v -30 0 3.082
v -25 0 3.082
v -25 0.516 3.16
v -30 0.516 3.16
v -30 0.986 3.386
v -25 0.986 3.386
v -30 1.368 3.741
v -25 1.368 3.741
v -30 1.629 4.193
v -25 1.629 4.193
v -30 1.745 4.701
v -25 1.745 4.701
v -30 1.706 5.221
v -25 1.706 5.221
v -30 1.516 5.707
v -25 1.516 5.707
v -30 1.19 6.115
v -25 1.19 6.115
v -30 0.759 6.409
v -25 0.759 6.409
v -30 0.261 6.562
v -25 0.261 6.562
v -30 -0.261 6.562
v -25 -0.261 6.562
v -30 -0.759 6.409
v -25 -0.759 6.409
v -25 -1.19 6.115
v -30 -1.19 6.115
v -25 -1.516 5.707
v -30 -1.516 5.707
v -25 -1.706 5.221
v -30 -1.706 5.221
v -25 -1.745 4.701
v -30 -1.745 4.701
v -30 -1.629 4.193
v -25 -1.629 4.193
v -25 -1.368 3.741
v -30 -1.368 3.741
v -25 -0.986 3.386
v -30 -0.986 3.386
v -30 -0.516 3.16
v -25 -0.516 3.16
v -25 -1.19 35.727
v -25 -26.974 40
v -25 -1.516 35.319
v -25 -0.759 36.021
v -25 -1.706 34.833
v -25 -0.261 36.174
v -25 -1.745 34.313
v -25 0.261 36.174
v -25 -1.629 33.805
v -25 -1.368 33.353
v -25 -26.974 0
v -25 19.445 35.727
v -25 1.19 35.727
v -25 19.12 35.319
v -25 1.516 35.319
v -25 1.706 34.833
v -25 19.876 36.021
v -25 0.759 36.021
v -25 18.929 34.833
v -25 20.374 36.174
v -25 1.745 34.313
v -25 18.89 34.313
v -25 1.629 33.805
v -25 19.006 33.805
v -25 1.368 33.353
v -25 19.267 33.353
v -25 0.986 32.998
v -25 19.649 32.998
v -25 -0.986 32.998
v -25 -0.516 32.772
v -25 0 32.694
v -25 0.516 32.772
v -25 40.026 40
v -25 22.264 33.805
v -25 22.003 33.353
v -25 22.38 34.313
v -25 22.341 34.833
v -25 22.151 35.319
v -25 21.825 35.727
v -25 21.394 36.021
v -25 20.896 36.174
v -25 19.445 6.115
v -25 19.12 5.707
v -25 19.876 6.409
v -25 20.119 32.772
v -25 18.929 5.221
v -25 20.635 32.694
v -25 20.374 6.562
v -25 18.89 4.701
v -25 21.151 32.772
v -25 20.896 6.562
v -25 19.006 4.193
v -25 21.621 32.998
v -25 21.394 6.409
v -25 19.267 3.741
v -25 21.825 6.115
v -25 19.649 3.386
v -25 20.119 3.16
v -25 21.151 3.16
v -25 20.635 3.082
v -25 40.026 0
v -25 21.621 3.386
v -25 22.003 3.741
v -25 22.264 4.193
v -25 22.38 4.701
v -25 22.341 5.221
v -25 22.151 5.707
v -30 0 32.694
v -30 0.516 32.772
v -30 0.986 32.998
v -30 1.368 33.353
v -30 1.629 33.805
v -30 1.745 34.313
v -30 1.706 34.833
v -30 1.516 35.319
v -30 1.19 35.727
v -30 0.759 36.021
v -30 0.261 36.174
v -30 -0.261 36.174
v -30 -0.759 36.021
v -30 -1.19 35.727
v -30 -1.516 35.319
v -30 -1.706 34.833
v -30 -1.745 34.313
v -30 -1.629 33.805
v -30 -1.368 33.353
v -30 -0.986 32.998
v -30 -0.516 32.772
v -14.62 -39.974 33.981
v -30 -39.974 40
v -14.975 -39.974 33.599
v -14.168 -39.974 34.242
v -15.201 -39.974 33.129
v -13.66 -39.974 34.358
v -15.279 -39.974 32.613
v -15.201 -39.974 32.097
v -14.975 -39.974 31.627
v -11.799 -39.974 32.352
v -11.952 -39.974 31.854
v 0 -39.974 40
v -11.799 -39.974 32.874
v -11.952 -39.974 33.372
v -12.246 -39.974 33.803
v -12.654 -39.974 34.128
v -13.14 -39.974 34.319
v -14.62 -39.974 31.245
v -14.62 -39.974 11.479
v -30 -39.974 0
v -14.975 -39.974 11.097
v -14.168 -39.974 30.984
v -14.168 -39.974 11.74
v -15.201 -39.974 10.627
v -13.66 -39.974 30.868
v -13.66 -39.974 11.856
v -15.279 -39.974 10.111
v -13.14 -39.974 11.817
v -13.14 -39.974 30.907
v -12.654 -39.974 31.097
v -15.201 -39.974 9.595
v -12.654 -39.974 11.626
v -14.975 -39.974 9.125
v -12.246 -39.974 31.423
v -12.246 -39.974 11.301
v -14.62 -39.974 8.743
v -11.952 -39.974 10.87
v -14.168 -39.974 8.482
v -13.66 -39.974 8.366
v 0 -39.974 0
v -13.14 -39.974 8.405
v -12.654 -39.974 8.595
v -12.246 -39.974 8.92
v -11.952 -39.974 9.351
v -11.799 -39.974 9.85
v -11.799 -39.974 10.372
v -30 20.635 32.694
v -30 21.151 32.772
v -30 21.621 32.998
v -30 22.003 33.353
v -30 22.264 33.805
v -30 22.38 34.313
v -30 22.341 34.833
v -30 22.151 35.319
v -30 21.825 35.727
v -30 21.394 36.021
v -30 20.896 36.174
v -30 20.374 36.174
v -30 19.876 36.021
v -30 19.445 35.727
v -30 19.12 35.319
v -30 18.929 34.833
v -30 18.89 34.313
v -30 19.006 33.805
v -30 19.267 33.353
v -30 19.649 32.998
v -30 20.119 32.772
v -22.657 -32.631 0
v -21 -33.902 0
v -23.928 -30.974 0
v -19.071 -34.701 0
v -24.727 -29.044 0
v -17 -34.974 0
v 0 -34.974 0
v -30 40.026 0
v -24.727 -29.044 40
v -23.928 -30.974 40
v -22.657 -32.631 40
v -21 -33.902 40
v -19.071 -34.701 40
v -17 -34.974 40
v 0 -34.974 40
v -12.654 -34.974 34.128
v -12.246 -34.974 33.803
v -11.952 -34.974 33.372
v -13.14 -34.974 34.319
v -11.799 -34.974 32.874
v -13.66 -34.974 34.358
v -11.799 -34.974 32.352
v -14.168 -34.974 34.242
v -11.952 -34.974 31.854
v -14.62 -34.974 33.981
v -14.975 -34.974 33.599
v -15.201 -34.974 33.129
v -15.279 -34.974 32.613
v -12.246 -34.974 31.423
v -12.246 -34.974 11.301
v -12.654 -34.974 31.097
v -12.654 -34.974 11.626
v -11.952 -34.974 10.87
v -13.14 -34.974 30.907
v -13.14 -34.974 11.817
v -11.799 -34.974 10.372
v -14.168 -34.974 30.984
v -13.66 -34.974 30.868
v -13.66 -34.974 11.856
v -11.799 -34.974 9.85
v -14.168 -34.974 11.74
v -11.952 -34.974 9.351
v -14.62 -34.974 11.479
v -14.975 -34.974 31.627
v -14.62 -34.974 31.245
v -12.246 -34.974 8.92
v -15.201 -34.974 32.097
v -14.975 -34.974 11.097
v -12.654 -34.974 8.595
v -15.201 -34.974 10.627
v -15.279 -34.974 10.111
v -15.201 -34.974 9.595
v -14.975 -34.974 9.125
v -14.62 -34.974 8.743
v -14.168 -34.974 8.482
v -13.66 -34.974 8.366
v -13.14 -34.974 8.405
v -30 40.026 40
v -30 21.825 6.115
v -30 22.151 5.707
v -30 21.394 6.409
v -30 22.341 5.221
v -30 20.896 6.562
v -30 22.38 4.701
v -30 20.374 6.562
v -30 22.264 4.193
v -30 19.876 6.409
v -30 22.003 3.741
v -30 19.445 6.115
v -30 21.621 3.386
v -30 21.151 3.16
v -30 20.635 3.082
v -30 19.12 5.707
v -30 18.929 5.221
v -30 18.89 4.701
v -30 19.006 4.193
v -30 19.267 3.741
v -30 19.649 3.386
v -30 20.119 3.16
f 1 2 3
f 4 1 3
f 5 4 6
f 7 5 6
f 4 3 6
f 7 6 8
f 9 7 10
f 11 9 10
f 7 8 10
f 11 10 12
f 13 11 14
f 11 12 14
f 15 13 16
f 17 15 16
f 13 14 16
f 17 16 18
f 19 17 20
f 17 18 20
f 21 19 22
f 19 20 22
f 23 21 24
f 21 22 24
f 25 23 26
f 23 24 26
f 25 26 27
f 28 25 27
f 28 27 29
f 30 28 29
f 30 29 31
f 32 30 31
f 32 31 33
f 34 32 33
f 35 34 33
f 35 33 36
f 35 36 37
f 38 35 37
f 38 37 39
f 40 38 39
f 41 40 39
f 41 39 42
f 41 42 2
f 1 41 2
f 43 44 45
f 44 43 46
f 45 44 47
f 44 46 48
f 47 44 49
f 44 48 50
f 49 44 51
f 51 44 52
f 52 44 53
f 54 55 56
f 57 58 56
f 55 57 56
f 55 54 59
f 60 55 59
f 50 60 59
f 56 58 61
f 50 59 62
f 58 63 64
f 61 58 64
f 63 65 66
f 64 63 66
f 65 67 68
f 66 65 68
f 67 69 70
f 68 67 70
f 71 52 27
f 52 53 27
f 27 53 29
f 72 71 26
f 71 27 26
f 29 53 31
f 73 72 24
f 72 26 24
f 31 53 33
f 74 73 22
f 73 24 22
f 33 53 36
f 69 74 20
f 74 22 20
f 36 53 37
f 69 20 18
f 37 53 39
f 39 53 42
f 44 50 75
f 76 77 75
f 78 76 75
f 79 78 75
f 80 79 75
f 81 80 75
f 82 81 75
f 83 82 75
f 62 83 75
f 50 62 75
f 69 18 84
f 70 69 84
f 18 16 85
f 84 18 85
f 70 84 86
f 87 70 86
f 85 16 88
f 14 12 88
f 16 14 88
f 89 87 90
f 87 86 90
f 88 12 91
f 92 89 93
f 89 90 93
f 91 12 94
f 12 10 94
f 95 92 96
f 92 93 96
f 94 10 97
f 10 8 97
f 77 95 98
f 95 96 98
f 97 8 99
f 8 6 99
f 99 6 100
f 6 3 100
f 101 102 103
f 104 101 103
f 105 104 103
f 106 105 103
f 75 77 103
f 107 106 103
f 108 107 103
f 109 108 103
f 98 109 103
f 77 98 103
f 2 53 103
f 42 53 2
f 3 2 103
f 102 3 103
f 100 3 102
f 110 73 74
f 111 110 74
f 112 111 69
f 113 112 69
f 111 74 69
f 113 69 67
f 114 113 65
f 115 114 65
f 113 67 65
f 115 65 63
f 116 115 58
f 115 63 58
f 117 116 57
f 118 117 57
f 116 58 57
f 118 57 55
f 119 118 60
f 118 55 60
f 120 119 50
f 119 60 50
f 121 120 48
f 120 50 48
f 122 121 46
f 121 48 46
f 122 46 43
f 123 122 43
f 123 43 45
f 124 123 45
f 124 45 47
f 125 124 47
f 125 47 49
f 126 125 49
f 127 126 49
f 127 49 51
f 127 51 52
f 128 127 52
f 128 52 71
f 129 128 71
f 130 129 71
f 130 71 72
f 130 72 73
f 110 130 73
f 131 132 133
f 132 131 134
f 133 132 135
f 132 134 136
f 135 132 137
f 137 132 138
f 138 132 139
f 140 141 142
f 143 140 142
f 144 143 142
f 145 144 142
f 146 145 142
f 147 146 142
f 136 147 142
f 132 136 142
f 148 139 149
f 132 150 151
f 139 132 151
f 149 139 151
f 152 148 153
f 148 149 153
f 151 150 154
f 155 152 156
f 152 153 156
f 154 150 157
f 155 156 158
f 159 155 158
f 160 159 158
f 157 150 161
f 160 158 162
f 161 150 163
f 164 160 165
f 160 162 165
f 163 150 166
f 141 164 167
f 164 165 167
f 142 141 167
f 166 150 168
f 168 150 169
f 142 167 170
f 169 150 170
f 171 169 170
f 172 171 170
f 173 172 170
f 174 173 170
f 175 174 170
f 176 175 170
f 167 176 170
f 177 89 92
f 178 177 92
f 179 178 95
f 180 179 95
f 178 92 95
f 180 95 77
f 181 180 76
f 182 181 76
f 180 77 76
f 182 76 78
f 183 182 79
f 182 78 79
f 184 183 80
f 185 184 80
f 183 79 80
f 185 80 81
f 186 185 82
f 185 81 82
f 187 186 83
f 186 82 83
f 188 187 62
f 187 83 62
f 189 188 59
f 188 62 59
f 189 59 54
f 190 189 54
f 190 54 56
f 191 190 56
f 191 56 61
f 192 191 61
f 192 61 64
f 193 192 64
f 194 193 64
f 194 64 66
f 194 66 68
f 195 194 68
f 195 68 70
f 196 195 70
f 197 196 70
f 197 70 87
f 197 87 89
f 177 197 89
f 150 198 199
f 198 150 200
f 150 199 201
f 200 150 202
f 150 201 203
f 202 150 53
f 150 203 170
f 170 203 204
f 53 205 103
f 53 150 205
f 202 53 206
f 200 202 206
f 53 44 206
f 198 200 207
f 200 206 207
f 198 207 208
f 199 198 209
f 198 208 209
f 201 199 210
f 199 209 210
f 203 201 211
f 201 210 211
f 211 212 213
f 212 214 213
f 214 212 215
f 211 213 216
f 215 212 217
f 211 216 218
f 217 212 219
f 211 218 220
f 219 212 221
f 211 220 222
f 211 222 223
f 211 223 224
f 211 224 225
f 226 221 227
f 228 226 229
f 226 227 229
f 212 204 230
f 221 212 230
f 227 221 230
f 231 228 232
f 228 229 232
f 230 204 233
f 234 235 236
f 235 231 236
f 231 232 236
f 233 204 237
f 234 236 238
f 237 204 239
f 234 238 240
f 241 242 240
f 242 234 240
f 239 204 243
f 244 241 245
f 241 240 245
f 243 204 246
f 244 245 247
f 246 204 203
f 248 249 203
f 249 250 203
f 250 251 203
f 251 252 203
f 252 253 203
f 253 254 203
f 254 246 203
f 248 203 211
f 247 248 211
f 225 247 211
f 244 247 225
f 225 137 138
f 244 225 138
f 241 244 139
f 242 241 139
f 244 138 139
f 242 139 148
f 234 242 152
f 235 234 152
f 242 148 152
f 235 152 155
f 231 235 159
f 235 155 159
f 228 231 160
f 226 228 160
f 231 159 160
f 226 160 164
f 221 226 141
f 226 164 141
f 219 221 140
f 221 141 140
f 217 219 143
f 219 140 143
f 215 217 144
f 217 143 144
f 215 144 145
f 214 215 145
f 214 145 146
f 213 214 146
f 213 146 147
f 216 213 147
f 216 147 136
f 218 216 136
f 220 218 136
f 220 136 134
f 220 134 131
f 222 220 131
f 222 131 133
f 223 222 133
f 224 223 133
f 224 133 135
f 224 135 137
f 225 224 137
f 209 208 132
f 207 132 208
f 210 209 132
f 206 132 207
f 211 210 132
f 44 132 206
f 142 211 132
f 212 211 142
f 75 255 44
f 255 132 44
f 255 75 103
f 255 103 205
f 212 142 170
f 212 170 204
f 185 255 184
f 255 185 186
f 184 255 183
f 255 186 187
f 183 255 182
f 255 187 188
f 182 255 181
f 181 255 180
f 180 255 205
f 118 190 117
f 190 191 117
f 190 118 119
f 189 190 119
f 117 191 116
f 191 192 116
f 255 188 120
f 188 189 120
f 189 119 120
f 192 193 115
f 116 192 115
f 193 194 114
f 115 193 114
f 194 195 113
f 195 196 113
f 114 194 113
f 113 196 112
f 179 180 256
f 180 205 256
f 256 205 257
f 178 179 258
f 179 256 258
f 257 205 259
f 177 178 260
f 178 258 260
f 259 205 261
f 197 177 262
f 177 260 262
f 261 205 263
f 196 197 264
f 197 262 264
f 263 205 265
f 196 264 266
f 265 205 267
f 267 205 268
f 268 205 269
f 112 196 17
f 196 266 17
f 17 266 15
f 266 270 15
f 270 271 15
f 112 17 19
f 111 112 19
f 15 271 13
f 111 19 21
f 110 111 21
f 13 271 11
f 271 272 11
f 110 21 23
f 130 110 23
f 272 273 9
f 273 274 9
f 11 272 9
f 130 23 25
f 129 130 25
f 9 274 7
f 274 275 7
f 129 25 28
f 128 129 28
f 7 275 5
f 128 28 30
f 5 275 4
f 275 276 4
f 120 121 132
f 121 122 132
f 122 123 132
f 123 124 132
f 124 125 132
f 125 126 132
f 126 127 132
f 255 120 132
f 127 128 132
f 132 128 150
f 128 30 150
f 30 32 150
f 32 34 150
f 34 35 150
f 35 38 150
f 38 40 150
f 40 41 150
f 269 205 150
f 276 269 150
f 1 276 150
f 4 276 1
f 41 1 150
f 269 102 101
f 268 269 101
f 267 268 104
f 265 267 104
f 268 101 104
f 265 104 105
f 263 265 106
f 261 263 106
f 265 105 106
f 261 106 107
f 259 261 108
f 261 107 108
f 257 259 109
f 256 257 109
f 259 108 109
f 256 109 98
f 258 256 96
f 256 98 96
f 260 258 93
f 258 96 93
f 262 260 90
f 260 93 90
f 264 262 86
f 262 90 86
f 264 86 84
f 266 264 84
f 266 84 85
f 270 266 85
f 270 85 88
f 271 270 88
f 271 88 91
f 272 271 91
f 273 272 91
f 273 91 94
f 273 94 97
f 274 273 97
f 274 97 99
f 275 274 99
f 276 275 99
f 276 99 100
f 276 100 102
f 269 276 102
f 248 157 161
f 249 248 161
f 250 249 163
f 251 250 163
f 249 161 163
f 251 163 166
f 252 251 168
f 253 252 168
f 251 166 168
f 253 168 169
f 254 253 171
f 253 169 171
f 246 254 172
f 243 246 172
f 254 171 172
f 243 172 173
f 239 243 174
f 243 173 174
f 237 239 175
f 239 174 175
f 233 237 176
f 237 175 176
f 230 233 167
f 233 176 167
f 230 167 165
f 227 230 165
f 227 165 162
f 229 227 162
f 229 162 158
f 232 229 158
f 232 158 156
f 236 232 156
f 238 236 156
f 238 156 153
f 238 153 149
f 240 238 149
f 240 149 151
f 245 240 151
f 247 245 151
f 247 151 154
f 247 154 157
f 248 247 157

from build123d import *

# Parameters (mm, degrees)
RESSALTO_EXTRUS_O1_DEPTH                   = 40
BROCA_DE_ROSQUEAR_PARA_HELICOIDE_M31_D     = 3.5
BROCA_DE_ROSQUEAR_PARA_HELICOIDE_M31_DEPTH = 10
BROCA_DE_ROSQUEAR_PARA_HELICOIDE_M31_TIP   = 1.051506083
BROCA_DE_ROSQUEAR_PARA_HELICOIDE_M32_D     = 3.5
BROCA_DE_ROSQUEAR_PARA_HELICOIDE_M32_DEPTH = 10
BROCA_DE_ROSQUEAR_PARA_HELICOIDE_M32_TIP   = 1.051506083
FILETE1_R                                  = 8


with BuildPart() as part:
    # Esboço1 → Ressalto-extrusão1 (new body)
    with BuildSketch(Plane.XY):
        Polygon((-30, 40.02617801), (-30, -39.97382199), (0, -39.97382199), (0, -34.97382199), (-25, -34.97382199), (-25, 40.02617801), align=None)
    extrude(amount=RESSALTO_EXTRUS_O1_DEPTH)

    # Broca de rosquear para helicoide M31
    with Locations(Plane(origin=(0, -34.97382199, 0), x_dir=(1, 0, 0), z_dir=(0, 1, 0))):
        with Locations((-13.529029312, -32.612904954), (-13.529029312, -10.11076891)):
            Hole(BROCA_DE_ROSQUEAR_PARA_HELICOIDE_M31_D / 2, depth=BROCA_DE_ROSQUEAR_PARA_HELICOIDE_M31_DEPTH)
            with Locations((0, 0, -(BROCA_DE_ROSQUEAR_PARA_HELICOIDE_M31_DEPTH + BROCA_DE_ROSQUEAR_PARA_HELICOIDE_M31_TIP / 2))):  # 118° drill point
                Cone(0, BROCA_DE_ROSQUEAR_PARA_HELICOIDE_M31_D / 2, BROCA_DE_ROSQUEAR_PARA_HELICOIDE_M31_TIP, mode=Mode.SUBTRACT)

    # Broca de rosquear para helicoide M32
    with Locations(Plane.ZY.offset(30)):
        with Locations((4.832044367, 20.635096837), (34.443923193, 20.635096837), (34.443923193, 0), (4.832044367, 0)):
            Hole(BROCA_DE_ROSQUEAR_PARA_HELICOIDE_M32_D / 2, depth=BROCA_DE_ROSQUEAR_PARA_HELICOIDE_M32_DEPTH)
            with Locations((0, 0, -(BROCA_DE_ROSQUEAR_PARA_HELICOIDE_M32_DEPTH + BROCA_DE_ROSQUEAR_PARA_HELICOIDE_M32_TIP / 2))):  # 118° drill point
                Cone(0, BROCA_DE_ROSQUEAR_PARA_HELICOIDE_M32_D / 2, BROCA_DE_ROSQUEAR_PARA_HELICOIDE_M32_TIP, mode=Mode.SUBTRACT)

    # Filete1
    filete1_edges = [part.edges().sort_by_distance(p)[0] for p in [
        (-25, -34.97382199, 20),
    ]]
    fillet(filete1_edges, radius=FILETE1_R)


solid = part.part
